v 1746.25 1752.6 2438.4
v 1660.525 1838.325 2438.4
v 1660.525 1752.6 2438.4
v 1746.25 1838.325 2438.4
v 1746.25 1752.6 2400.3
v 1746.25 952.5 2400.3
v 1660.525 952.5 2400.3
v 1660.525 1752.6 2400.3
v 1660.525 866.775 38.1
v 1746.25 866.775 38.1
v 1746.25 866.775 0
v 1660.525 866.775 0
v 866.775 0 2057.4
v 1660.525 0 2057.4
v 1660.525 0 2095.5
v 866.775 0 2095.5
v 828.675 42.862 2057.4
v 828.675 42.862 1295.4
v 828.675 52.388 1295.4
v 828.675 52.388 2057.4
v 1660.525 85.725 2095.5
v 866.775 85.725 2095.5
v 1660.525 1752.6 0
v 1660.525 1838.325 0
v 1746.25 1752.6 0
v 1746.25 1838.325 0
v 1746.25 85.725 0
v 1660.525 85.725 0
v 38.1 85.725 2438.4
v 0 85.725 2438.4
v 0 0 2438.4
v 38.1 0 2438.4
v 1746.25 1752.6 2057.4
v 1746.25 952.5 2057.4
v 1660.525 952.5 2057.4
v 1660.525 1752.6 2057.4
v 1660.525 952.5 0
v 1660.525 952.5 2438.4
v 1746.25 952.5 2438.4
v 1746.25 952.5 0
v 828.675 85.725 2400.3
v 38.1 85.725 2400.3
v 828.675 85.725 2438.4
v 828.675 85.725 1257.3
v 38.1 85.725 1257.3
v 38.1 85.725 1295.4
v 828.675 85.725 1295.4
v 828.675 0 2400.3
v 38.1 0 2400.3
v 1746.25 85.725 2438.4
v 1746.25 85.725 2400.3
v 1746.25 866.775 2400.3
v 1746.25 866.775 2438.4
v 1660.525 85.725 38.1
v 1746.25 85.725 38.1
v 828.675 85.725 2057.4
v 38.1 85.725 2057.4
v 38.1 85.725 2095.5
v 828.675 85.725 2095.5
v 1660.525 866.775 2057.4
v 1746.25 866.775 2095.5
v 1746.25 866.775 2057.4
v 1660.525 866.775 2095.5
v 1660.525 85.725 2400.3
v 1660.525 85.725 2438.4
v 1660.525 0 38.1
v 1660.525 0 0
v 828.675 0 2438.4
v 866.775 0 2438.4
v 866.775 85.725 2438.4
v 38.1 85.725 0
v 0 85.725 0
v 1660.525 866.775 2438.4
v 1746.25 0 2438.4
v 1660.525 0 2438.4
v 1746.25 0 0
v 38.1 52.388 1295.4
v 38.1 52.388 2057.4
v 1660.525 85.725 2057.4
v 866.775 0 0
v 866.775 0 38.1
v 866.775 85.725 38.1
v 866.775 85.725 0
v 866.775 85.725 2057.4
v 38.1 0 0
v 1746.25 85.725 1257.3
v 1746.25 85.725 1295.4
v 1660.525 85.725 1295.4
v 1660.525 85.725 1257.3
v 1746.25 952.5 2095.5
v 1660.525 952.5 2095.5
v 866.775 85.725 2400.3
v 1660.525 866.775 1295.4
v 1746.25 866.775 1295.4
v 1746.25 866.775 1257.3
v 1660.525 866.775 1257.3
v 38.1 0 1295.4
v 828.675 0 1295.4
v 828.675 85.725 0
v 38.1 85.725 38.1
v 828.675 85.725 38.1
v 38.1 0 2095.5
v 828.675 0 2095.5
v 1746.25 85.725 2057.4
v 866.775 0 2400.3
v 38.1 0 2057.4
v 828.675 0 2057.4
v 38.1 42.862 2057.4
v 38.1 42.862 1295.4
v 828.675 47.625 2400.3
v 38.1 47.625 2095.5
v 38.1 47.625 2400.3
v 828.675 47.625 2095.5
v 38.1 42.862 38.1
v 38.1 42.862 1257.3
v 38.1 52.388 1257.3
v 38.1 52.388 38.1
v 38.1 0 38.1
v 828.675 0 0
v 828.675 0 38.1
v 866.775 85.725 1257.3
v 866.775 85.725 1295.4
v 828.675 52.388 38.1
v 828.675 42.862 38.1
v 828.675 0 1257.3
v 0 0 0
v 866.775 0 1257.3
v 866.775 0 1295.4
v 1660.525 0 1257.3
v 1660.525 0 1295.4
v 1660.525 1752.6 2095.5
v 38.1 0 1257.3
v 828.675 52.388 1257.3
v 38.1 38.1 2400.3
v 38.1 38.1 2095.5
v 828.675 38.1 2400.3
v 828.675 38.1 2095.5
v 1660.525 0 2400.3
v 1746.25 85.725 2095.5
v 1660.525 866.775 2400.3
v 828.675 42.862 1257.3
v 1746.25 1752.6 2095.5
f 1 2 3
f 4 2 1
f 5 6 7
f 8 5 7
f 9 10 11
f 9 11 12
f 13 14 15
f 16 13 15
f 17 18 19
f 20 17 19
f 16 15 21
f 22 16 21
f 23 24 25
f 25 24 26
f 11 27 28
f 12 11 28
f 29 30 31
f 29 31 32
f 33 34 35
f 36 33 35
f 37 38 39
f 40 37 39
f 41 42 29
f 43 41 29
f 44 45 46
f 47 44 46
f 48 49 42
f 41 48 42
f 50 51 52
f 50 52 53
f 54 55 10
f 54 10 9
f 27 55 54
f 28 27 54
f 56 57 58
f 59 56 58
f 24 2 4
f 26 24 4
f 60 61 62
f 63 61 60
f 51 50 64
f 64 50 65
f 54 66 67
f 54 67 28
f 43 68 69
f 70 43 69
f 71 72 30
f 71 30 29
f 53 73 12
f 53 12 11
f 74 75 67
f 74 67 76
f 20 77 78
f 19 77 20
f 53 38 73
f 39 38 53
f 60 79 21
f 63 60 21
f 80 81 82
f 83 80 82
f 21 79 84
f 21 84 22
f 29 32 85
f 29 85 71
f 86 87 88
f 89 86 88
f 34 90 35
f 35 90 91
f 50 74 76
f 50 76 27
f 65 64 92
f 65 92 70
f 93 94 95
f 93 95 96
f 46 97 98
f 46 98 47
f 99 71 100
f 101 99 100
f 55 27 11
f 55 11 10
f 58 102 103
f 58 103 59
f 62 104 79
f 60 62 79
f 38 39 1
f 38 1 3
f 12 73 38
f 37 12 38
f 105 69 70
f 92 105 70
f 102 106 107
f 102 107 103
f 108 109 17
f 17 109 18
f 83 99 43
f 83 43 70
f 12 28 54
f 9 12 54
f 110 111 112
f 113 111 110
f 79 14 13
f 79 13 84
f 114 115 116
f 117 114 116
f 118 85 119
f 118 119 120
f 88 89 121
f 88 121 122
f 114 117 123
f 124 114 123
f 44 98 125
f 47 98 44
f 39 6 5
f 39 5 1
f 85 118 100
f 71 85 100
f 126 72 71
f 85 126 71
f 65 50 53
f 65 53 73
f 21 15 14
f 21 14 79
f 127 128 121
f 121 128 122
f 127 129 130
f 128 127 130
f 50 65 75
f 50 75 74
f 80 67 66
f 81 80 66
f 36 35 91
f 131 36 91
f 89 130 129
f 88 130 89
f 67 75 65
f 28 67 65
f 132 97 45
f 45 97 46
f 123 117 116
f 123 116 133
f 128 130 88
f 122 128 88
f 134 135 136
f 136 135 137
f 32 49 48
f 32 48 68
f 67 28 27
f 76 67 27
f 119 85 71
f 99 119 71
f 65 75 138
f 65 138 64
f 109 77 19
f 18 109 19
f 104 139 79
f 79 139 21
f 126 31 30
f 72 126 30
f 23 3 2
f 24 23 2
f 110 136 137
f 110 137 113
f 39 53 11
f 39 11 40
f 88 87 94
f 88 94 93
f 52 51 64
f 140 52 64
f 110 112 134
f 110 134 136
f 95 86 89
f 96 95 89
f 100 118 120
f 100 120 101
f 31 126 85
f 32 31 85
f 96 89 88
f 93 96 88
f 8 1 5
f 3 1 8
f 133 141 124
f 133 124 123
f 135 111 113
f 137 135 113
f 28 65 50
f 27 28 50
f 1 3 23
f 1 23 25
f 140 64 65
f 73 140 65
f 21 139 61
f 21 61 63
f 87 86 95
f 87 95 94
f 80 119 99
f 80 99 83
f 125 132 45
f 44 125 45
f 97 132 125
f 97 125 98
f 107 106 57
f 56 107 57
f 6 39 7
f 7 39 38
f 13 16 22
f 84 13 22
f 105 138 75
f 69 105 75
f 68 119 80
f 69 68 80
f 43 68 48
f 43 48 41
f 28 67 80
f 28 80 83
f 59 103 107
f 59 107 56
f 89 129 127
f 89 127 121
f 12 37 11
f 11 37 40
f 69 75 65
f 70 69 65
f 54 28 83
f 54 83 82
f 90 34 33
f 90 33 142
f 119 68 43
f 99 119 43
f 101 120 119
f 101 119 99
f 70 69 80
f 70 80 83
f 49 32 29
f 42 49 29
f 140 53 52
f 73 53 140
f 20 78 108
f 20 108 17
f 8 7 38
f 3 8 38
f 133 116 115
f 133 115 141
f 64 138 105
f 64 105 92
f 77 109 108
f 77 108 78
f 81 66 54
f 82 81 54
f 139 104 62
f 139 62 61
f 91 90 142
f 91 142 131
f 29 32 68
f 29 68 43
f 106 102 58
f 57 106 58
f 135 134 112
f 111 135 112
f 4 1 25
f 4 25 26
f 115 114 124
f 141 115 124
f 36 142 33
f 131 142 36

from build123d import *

# Parameters (mm, degrees)
F0_W      = 38.1
F0_H      = 85.725
F1_DEPTH  = 2438.4
F0_W_2    = 85.725
F3_W      = 85.725
F3_H      = 38.1
F4_DEPTH  = 790.575
F2_W      = 85.725
F2_H      = 38.1
F5_DEPTH  = 793.75
F6_W      = 85.725
F6_H      = 38.1
F7_DEPTH  = 781.05
F8_W      = 85.725
F8_H      = 38.1
F9_DEPTH  = 781.05
F10_W     = 85.725
F10_H     = 38.1
F11_DEPTH = 793.75
F12_W     = 85.725
F12_H     = 38.1
F13_DEPTH = 790.575
F14_W     = 85.725
F14_H     = 38.1
F15_DEPTH = 800.1
F16_W     = 85.725
F16_H     = 38.1
F17_DEPTH = 790.575
F18_W     = 85.725
F18_H     = 38.1
F19_DEPTH = 793.75
F20_W     = 85.725
F20_H     = 38.1
F21_DEPTH = 781.05
F22_W     = 85.725
F22_H     = 38.1
F23_DEPTH = 800.1
F24_W     = 85.725
F24_H     = 38.1
F25_DEPTH = 781.05
F26_W     = 85.725
F26_H     = 38.1
F27_DEPTH = 793.75
F28_W     = 85.725
F28_H     = 38.1
F29_DEPTH = 790.575
F30_W     = 790.575
F30_H     = 9.525
F31_DEPTH = 1219.2
F32_W     = 790.575
F32_H     = 9.525
F33_DEPTH = 762
F34_W     = 790.575
F34_H     = 9.525
F35_DEPTH = 304.8


with BuildPart() as f1:
    # F0 (on Top) → F1 (new body)
    with BuildSketch(Plane.XY):
        with Locations((19.05, 42.8625)):
            Rectangle(F0_W, F0_H)
    extrude(amount=F1_DEPTH)


with BuildPart() as f1b:
    # F0 (on Top) → F1, piece 2 (new body)
    with BuildSketch(Plane.XY):
        with Locations((847.725, 42.8625)):
            Rectangle(F0_W, F0_H)
    extrude(amount=F1_DEPTH)


with BuildPart() as f1c:
    # F0 (on Top) → F1, piece 3 (new body)
    with BuildSketch(Plane.XY):
        with Locations((1703.3875, 42.8625)):
            Rectangle(F0_W_2, F0_H)
    extrude(amount=F1_DEPTH)


with BuildPart() as f1d:
    # F0 (on Top) → F1, piece 4 (new body)
    with BuildSketch(Plane.XY):
        with Locations((1703.3875, 909.6375)):
            Rectangle(F0_W_2, F0_H)
    extrude(amount=F1_DEPTH)


with BuildPart() as f1e:
    # F0 (on Top) → F1, piece 5 (new body)
    with BuildSketch(Plane.XY):
        with Locations((1703.3875, 1795.4625)):
            Rectangle(F0_W_2, F0_H)
    extrude(amount=F1_DEPTH)


with BuildPart() as f4:
    # F3 (on face) → F4 (new body, through all)
    with BuildSketch(Plane.YZ.offset(38.1)):
        with Locations((42.8625, 19.05)):
            Rectangle(F3_W, F3_H)
    extrude(amount=F4_DEPTH)


with BuildPart() as f5:
    # F2 (on face) → F5 (new body)
    with BuildSketch(Plane.YZ.offset(866.775)):
        with Locations((42.8625, 19.05)):
            Rectangle(F2_W, F2_H)
    extrude(amount=F5_DEPTH)


with BuildPart() as f7:
    # F6 (on face) → F7 (new body, through all)
    with BuildSketch(Plane(origin=(0, 85.725, 0), x_dir=(-1, 0, 0), z_dir=(0, 1, 0))):
        with Locations((-1703.3875, 19.05)):
            Rectangle(F6_W, F6_H)
    extrude(amount=F7_DEPTH)


with BuildPart() as f9:
    # F8 (on face) → F9 (new body, through all)
    with BuildSketch(Plane(origin=(0, 85.725, 0), x_dir=(-1, 0, 0), z_dir=(0, 1, 0))):
        with Locations((-1703.3875, 2419.35)):
            Rectangle(F8_W, F8_H)
    extrude(amount=F9_DEPTH)


with BuildPart() as f11:
    # F10 (on face) → F11 (new body, through all)
    with BuildSketch(Plane.YZ.offset(866.775)):
        with Locations((42.8625, 2419.35)):
            Rectangle(F10_W, F10_H)
    extrude(amount=F11_DEPTH)


with BuildPart() as f13:
    # F12 (on face) → F13 (new body, through all)
    with BuildSketch(Plane.YZ.offset(38.1)):
        with Locations((42.8625, 2419.35)):
            Rectangle(F12_W, F12_H)
    extrude(amount=F13_DEPTH)


with BuildPart() as f15:
    # F14 (on face) → F15 (new body, through all)
    with BuildSketch(Plane(origin=(0, 952.5, 0), x_dir=(-1, 0, 0), z_dir=(0, 1, 0))):
        with Locations((-1703.3875, 2419.35)):
            Rectangle(F14_W, F14_H)
    extrude(amount=F15_DEPTH)


with BuildPart() as f17:
    # F16 (on face) → F17 (new body, through all)
    with BuildSketch(Plane.YZ.offset(38.1)):
        with Locations((42.8625, 2076.45)):
            Rectangle(F16_W, F16_H)
    extrude(amount=F17_DEPTH)


with BuildPart() as f19:
    # F18 (on face) → F19 (new body, through all)
    with BuildSketch(Plane.YZ.offset(866.775)):
        with Locations((42.8625, 2076.45)):
            Rectangle(F18_W, F18_H)
    extrude(amount=F19_DEPTH)


with BuildPart() as f21:
    # F20 (on face) → F21 (new body, through all)
    with BuildSketch(Plane(origin=(0, 85.725, 0), x_dir=(-1, 0, 0), z_dir=(0, 1, 0))):
        with Locations((-1703.3875, 2076.45)):
            Rectangle(F20_W, F20_H)
    extrude(amount=F21_DEPTH)


with BuildPart() as f23:
    # F22 (on face) → F23 (new body, through all)
    with BuildSketch(Plane(origin=(0, 952.5, 0), x_dir=(-1, 0, 0), z_dir=(0, 1, 0))):
        with Locations((-1703.3875, 2076.45)):
            Rectangle(F22_W, F22_H)
    extrude(amount=F23_DEPTH)


with BuildPart() as f25:
    # F24 (on face) → F25 (new body, through all)
    with BuildSketch(Plane(origin=(0, 85.725, 0), x_dir=(-1, 0, 0), z_dir=(0, 1, 0))):
        with Locations((-1703.3875, 1276.35)):
            Rectangle(F24_W, F24_H)
    extrude(amount=F25_DEPTH)


with BuildPart() as f27:
    # F26 (on face) → F27 (new body, through all)
    with BuildSketch(Plane.YZ.offset(866.775)):
        with Locations((42.8625, 1276.35)):
            Rectangle(F26_W, F26_H)
    extrude(amount=F27_DEPTH)


with BuildPart() as f29:
    # F28 (on face) → F29 (new body, through all)
    with BuildSketch(Plane.YZ.offset(38.1)):
        with Locations((42.8625, 1276.35)):
            Rectangle(F28_W, F28_H)
    extrude(amount=F29_DEPTH)


with BuildPart() as f31:
    # F30 (on face) → F31 (new body, through all)
    with BuildSketch(Plane.XY.offset(38.1)):
        with Locations((433.3875, 47.625)):
            Rectangle(F30_W, F30_H)
    extrude(amount=F31_DEPTH)


with BuildPart() as f33:
    # F32 (on face) → F33 (new body, through all)
    with BuildSketch(Plane.XY.offset(1295.4)):
        with Locations((433.3875, 47.625)):
            Rectangle(F32_W, F32_H)
    extrude(amount=F33_DEPTH)


with BuildPart() as f35:
    # F34 (on face) → F35 (new body, through all)
    with BuildSketch(Plane.XY.offset(2095.5)):
        with Locations((433.3875, 42.8625)):
            Rectangle(F34_W, F34_H)
    extrude(amount=F35_DEPTH)


solid = Compound([f1.part, f1b.part, f1c.part, f1d.part, f1e.part, f4.part, f5.part, f7.part, f9.part, f11.part, f13.part, f15.part, f17.part, f19.part, f21.part, f23.part, f25.part, f27.part, f29.part, f31.part, f33.part, f35.part])
